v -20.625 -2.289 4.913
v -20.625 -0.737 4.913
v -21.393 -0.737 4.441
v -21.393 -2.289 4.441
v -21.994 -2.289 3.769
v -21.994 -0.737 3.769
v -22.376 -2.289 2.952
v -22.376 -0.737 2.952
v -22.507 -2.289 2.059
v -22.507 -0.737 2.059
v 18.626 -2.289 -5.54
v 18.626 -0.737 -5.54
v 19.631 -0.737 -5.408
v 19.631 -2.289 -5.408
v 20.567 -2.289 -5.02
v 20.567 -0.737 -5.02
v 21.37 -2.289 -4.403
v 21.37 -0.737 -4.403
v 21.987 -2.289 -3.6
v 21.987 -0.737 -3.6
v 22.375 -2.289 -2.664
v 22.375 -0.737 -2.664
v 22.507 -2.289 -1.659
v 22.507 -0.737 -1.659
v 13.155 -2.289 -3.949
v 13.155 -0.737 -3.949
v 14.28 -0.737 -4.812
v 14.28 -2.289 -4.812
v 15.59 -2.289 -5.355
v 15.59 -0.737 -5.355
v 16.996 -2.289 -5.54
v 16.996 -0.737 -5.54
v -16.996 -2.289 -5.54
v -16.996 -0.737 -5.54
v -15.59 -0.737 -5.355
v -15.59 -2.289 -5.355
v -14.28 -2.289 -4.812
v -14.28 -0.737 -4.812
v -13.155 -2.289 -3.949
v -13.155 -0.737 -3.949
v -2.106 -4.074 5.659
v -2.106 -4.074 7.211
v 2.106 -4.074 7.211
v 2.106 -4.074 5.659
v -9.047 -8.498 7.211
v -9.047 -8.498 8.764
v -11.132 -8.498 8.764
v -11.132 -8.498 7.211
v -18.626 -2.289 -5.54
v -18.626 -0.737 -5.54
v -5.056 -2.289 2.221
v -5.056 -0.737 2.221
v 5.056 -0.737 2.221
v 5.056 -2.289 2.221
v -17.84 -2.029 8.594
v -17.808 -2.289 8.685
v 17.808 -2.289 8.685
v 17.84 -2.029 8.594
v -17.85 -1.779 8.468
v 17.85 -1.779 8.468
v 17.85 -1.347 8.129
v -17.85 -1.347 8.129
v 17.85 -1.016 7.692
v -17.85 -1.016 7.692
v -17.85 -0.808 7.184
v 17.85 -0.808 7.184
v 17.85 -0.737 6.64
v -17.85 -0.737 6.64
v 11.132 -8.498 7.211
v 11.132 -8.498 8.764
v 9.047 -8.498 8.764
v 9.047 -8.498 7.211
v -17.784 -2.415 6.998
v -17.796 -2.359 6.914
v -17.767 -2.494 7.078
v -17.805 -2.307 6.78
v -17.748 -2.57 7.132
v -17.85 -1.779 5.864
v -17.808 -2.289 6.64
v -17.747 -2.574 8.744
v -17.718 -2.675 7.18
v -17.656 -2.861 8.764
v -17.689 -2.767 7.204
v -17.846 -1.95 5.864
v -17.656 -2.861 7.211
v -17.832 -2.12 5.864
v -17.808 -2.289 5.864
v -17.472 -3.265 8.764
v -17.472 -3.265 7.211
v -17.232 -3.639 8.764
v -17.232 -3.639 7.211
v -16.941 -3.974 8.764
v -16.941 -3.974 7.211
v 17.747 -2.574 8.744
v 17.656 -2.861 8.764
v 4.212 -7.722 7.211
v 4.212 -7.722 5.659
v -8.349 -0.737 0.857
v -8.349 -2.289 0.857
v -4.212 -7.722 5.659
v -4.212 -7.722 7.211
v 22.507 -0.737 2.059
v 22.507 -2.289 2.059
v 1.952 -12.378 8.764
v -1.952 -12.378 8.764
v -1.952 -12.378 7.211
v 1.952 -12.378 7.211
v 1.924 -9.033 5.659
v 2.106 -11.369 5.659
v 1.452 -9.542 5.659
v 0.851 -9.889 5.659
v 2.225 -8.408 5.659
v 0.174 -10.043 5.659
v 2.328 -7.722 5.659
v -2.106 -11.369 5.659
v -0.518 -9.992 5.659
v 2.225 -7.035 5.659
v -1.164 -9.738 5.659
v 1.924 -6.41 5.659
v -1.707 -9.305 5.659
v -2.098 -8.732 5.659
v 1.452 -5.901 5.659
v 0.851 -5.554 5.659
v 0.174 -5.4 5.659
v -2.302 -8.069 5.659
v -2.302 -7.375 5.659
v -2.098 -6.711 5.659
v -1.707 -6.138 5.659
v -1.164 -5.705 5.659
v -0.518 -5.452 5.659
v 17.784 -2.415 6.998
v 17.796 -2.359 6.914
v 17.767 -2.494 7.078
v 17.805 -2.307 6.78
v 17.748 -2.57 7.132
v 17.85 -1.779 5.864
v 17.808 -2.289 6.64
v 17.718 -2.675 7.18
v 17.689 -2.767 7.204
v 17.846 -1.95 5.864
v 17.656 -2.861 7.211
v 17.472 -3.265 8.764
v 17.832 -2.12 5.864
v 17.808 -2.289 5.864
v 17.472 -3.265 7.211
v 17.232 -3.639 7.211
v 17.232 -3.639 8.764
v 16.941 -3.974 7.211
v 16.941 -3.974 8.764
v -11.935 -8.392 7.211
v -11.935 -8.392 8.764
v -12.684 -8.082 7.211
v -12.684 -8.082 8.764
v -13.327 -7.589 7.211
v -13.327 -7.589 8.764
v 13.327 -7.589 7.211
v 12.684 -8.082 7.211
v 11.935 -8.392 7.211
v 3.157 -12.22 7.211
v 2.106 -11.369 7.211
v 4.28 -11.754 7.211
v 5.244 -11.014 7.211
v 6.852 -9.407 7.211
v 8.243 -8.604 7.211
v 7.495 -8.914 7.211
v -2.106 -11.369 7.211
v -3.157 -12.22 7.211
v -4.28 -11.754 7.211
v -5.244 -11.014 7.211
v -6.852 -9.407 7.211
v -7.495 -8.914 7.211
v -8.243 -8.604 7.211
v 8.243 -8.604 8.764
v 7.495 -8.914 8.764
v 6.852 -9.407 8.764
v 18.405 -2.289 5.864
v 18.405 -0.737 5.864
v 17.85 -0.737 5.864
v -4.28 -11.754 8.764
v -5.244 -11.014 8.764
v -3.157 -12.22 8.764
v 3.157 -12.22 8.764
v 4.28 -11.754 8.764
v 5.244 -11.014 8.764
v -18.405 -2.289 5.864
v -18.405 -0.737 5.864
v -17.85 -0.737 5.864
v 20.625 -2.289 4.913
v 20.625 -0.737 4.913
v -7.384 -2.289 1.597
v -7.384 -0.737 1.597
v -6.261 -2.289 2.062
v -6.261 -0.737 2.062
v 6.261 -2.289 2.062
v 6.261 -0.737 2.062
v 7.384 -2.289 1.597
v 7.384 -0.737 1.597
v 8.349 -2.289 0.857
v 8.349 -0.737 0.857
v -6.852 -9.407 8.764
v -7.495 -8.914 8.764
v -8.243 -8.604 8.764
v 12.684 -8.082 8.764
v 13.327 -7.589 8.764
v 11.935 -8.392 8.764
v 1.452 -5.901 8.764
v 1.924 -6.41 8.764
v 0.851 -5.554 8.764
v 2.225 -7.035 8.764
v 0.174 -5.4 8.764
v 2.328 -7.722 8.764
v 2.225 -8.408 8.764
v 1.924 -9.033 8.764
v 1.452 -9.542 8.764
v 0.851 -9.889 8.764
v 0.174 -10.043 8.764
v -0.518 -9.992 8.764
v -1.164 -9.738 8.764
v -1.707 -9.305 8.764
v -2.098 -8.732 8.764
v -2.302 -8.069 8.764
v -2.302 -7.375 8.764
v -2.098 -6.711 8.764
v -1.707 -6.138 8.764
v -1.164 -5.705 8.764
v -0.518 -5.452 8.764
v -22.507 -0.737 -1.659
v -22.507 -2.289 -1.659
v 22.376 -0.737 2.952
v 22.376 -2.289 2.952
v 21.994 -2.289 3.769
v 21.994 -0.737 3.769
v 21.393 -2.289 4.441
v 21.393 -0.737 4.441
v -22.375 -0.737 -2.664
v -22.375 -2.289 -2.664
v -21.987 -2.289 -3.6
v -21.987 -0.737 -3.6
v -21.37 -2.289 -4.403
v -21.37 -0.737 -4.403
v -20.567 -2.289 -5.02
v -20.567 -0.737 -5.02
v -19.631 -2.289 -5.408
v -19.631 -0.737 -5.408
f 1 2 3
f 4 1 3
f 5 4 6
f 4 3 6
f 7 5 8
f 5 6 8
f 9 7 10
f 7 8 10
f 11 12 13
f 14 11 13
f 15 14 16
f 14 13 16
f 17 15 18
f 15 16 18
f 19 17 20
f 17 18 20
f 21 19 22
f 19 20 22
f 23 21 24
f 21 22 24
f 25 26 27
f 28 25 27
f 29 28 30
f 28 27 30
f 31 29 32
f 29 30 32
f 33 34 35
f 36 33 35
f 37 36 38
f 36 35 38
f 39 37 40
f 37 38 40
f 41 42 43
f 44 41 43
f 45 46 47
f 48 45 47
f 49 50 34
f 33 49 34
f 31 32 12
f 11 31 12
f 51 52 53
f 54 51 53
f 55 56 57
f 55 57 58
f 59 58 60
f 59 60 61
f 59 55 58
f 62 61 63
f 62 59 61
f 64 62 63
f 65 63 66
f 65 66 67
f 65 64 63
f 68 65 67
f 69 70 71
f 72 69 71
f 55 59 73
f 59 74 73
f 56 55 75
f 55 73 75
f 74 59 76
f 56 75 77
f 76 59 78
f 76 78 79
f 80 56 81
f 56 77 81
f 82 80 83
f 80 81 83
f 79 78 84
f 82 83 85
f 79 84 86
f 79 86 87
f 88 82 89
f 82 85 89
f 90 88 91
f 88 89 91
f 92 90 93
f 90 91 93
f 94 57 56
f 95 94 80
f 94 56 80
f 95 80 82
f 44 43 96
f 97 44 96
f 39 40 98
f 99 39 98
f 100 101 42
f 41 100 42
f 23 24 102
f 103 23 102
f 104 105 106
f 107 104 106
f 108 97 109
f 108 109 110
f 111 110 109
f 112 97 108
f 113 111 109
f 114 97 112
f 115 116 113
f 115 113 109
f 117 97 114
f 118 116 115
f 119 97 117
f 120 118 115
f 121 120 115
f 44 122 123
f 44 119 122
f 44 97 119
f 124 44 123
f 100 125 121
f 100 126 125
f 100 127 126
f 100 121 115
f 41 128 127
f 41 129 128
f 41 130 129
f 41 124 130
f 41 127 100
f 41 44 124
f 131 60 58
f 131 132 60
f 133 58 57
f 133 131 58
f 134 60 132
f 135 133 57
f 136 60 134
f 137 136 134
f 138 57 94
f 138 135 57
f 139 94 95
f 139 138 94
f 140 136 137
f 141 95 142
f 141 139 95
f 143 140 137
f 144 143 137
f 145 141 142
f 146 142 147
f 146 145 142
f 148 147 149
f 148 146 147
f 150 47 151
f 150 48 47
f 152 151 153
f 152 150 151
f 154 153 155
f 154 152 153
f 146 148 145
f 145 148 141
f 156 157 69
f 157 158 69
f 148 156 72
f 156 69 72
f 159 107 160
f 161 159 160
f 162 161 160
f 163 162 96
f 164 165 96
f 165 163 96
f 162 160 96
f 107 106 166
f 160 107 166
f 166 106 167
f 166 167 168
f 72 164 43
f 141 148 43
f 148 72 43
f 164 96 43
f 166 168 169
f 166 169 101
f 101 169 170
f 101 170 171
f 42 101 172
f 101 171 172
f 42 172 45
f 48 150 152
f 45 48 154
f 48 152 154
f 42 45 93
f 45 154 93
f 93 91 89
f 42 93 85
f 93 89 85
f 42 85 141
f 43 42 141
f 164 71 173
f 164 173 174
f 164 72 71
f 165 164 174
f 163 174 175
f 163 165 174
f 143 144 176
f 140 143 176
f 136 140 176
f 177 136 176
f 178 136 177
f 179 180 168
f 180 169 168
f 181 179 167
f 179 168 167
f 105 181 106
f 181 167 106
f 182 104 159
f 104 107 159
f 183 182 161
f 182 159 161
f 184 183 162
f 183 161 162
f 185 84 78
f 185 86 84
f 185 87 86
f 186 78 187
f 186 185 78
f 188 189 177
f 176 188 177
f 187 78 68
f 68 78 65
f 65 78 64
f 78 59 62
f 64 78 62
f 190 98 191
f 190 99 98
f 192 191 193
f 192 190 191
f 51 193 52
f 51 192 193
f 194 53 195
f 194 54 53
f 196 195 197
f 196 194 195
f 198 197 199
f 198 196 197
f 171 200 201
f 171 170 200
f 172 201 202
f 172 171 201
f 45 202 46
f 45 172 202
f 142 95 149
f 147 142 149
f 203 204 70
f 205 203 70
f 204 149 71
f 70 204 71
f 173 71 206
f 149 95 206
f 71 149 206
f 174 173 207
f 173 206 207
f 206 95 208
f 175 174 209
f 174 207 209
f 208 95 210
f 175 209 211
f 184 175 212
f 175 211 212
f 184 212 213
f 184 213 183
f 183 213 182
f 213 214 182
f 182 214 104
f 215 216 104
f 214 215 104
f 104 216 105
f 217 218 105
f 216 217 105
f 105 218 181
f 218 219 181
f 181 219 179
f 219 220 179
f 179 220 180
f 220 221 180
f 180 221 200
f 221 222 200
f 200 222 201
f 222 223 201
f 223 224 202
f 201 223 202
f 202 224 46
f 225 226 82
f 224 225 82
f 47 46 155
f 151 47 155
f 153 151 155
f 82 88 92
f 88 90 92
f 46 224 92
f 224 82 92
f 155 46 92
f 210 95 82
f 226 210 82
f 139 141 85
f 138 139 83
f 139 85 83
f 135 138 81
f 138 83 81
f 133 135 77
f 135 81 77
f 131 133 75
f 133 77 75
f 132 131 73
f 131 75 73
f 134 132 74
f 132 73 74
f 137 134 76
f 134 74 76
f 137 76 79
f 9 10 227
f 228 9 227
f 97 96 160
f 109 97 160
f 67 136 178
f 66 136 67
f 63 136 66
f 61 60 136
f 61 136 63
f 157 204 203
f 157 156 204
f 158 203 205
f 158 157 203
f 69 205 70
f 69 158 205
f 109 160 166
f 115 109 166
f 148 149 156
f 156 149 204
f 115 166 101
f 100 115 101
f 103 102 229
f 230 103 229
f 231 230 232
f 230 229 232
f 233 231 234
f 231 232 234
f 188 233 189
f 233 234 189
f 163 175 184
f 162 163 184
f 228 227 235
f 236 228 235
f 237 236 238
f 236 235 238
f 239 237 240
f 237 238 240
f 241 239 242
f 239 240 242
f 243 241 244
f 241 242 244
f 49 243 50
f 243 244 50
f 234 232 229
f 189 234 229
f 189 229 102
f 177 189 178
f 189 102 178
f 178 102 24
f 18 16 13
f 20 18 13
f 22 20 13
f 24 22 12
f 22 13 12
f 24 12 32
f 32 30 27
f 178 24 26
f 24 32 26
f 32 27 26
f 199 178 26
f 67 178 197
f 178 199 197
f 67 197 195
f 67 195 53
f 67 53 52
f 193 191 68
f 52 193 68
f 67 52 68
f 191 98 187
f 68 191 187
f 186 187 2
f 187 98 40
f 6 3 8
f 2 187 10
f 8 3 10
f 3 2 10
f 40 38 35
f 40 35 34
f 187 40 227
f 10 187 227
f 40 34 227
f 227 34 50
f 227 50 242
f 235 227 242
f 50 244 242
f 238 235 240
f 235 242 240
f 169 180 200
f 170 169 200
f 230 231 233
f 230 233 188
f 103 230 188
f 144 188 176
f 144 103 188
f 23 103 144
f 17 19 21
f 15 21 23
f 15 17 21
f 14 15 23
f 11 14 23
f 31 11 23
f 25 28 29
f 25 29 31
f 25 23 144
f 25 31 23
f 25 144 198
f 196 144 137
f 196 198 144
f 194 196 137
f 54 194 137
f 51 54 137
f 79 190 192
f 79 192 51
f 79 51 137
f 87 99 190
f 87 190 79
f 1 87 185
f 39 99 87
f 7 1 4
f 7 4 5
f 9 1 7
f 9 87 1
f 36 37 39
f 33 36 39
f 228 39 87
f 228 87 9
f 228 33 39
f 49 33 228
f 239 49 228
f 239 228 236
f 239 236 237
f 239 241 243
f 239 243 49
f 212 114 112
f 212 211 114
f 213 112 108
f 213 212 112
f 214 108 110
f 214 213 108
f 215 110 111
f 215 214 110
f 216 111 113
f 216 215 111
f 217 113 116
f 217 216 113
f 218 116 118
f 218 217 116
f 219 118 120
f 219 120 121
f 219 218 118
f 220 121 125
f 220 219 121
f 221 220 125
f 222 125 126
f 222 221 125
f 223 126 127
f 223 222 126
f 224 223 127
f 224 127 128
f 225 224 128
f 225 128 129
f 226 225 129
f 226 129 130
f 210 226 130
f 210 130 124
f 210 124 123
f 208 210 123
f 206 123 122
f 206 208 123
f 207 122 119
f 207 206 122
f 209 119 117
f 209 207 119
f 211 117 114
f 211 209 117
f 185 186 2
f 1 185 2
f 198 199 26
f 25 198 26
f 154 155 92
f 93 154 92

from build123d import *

# Parameters (mm, degrees)
BASE_FLANGE1_DEPTH   = 2
EDGE_FLANGE1_START   = -23
EDGE_FLANGE1_DEPTH   = 46
EDGE_FLANGE1_START_2 = -23.714787909
EDGE_FLANGE1_2_DEPTH = 0.714787909
EDGE_FLANGE1_START_3 = 23
EDGE_FLANGE1_3_DEPTH = 0.714787909
EDGE_FLANGE1_4_DEPTH = 46
CUT_EXTRUDE1_DEPTH   = 10
FILLET1_R            = 4
FILLET2_R            = 6
SKETCH9_R            = 3
CUT_EXTRUDE2_DEPTH   = 10
SKETCH10_R           = 3
BOSS_EXTRUDE1_DEPTH  = 2
SCALE1_SCALE         = 0.7761


# Read off the part's stored shape, not the designer's step: Edge-Flange1
# Sheet-metal steps are written as plain solids
with BuildPart() as part:
    # Sketch1 → Base-Flange1 (new body)
    with BuildSketch(Plane(origin=(0, 0, 0), x_dir=(1, 0, 0), z_dir=(0, 1, 0))):
        with BuildLine():
            Line((-16.949747468, 6.379735664), (-9, -1.570011804))
            Line((-9, -1.570011804), (9, -1.570011804))
            Line((9, -1.570011804), (16.949747468, 6.379735664))
            ThreePointArc((16.949747468, 6.379735664), (19.22071091, 7.897144924), (21.899494937, 8.429988196))
            Line((21.899494937, 8.429988196), (24, 8.429988196))
            ThreePointArc((24, 8.429988196), (27.535533906, 6.965522102), (29, 3.429988196))
            Line((29, 3.429988196), (29, -1.361639596))
            ThreePointArc((29, -1.361639596), (28.339066725, -3.564054954), (26.574683296, -5.038645514))
            Line((26.574683296, -5.038645514), (23, -6.569508994))
            Line((23, -6.569508994), (23, -10))
            Line((23, -10), (-23, -10))
            Line((-23, -10), (-23, -6.569508994))
            Line((-23, -6.569508994), (-26.574683296, -5.038645514))
            ThreePointArc((-26.574683296, -5.038645514), (-28.339066725, -3.564054954), (-29, -1.361639596))
            Line((-29, -1.361639596), (-29, 3.429988196))
            ThreePointArc((-29, 3.429988196), (-27.535533906, 6.965522102), (-24, 8.429988196))
            Line((-24, 8.429988196), (-21.899494937, 8.429988196))
            ThreePointArc((-21.899494937, 8.429988196), (-19.22071091, 7.897144924), (-16.949747468, 6.379735664))
        make_face()
    extrude(amount=-BASE_FLANGE1_DEPTH)

    # Edge-Flange1 outline → Edge-Flange1 (cut)
    with BuildSketch(Plane.YZ.offset(EDGE_FLANGE1_START)):
        with BuildLine():
            ThreePointArc((-2, 9.899002398), (-0.556604688, 8.917667209), (0, 7.2634))
            Line((0, 7.2634), (0, 10))
            Line((0, 10), (-2, 10))
            Line((-2, 10), (-2, 9.899002398))
        make_face()
    extrude(amount=EDGE_FLANGE1_DEPTH, mode=Mode.SUBTRACT)

    # Edge-Flange1 2 outline → Edge-Flange1 2 (cut)
    with BuildSketch(Plane.YZ.offset(EDGE_FLANGE1_START_2)):
        with BuildLine():
            Line((-2, 6.2634), (0, 6.2634))
            Line((0, 6.2634), (0, 7.2634))
            ThreePointArc((0, 7.2634), (-0.556604688, 8.917667209), (-2, 9.899002398))
            Line((-2, 9.899002398), (-2, 6.2634))
        make_face()
    extrude(amount=EDGE_FLANGE1_2_DEPTH, mode=Mode.SUBTRACT)

    # Edge-Flange1 3 outline → Edge-Flange1 3 (cut)
    with BuildSketch(Plane.YZ.offset(EDGE_FLANGE1_START_3)):
        with BuildLine():
            Line((-2, 6.2634), (0, 6.2634))
            Line((0, 6.2634), (0, 7.2634))
            ThreePointArc((0, 7.2634), (-0.556604688, 8.917667209), (-2, 9.899002398))
            Line((-2, 9.899002398), (-2, 6.2634))
        make_face()
    extrude(amount=EDGE_FLANGE1_3_DEPTH, mode=Mode.SUBTRACT)

    # Edge-Flange1 4 outline → Edge-Flange1 4 (add)
    with BuildSketch(Plane.YZ.offset(EDGE_FLANGE1_START)):
        with BuildLine():
            ThreePointArc((-2.7366, 8), (-2.215745145, 7.784254855), (-2, 7.2634))
            Line((-2, 7.2634), (-2, 9.899002398))
            ThreePointArc((-2, 9.899002398), (-2.364854094, 9.974633029), (-2.7366, 10))
            Line((-2.7366, 10), (-15, 10))
            Line((-15, 10), (-15, 8))
            Line((-15, 8), (-2.7366, 8))
        make_face()
    extrude(amount=EDGE_FLANGE1_4_DEPTH)

    # Sketch8 → Cut-Extrude1 (cut)
    with BuildSketch(Plane.XY.offset(10)):
        Polygon((-16, -10), (-23, -3), (-23, -15), (-5, -15), (-10, -10), align=None)
        Polygon((10, -10), (5, -15), (23, -15), (23, -3), (16, -10), align=None)
    extrude(amount=-CUT_EXTRUDE1_DEPTH, mode=Mode.SUBTRACT)

    # Fillet1
    fillet1_edges = [part.edges().sort_by_distance(p)[0] for p in [
        (-23, -3, 9),
        (-16, -10, 9),
        (-10, -10, 9),
        (10, -10, 9),
        (16, -10, 9),
        (23, -3, 9),
    ]]
    fillet(fillet1_edges, radius=FILLET1_R)

    # Fillet2
    fillet2_edges = [part.edges().sort_by_distance(p)[0] for p in [
        (-5, -15, 9),
        (5, -15, 9),
        (9, -1, 1.570011804),
        (-9, -1, 1.570011804),
    ]]
    fillet(fillet2_edges, radius=FILLET2_R)

    # Sketch9 → Cut-Extrude2 (cut)
    with BuildSketch(Plane.XY.offset(10)):
        with Locations((0, -9)):
            Circle(SKETCH9_R)
    extrude(amount=-CUT_EXTRUDE2_DEPTH, mode=Mode.SUBTRACT)

    # Sketch10 → Boss-Extrude1 (add)
    with BuildSketch(Plane(origin=(0, 0, 8), x_dir=(-1, 0, 0), z_dir=(0, 0, -1))):
        Polygon((5.42709253, -9), (2.713546265, -4.3), (-2.713546265, -4.3), (-5.42709253, -9), (-2.713546265, -13.7), (2.713546265, -13.7), align=None)
        with Locations(Location((0, -9, 0), (0, 0, 180))):
            Circle(SKETCH10_R, mode=Mode.SUBTRACT)
    extrude(amount=BOSS_EXTRUDE1_DEPTH)


with BuildPart() as part_1:
    # Scale1: scaled about (0, -3.290648573, 4.477741927)
    add(part.part.scale(SCALE1_SCALE).moved(Location((0, -0.736776215, 1.002566417))))


solid = part_1.part
